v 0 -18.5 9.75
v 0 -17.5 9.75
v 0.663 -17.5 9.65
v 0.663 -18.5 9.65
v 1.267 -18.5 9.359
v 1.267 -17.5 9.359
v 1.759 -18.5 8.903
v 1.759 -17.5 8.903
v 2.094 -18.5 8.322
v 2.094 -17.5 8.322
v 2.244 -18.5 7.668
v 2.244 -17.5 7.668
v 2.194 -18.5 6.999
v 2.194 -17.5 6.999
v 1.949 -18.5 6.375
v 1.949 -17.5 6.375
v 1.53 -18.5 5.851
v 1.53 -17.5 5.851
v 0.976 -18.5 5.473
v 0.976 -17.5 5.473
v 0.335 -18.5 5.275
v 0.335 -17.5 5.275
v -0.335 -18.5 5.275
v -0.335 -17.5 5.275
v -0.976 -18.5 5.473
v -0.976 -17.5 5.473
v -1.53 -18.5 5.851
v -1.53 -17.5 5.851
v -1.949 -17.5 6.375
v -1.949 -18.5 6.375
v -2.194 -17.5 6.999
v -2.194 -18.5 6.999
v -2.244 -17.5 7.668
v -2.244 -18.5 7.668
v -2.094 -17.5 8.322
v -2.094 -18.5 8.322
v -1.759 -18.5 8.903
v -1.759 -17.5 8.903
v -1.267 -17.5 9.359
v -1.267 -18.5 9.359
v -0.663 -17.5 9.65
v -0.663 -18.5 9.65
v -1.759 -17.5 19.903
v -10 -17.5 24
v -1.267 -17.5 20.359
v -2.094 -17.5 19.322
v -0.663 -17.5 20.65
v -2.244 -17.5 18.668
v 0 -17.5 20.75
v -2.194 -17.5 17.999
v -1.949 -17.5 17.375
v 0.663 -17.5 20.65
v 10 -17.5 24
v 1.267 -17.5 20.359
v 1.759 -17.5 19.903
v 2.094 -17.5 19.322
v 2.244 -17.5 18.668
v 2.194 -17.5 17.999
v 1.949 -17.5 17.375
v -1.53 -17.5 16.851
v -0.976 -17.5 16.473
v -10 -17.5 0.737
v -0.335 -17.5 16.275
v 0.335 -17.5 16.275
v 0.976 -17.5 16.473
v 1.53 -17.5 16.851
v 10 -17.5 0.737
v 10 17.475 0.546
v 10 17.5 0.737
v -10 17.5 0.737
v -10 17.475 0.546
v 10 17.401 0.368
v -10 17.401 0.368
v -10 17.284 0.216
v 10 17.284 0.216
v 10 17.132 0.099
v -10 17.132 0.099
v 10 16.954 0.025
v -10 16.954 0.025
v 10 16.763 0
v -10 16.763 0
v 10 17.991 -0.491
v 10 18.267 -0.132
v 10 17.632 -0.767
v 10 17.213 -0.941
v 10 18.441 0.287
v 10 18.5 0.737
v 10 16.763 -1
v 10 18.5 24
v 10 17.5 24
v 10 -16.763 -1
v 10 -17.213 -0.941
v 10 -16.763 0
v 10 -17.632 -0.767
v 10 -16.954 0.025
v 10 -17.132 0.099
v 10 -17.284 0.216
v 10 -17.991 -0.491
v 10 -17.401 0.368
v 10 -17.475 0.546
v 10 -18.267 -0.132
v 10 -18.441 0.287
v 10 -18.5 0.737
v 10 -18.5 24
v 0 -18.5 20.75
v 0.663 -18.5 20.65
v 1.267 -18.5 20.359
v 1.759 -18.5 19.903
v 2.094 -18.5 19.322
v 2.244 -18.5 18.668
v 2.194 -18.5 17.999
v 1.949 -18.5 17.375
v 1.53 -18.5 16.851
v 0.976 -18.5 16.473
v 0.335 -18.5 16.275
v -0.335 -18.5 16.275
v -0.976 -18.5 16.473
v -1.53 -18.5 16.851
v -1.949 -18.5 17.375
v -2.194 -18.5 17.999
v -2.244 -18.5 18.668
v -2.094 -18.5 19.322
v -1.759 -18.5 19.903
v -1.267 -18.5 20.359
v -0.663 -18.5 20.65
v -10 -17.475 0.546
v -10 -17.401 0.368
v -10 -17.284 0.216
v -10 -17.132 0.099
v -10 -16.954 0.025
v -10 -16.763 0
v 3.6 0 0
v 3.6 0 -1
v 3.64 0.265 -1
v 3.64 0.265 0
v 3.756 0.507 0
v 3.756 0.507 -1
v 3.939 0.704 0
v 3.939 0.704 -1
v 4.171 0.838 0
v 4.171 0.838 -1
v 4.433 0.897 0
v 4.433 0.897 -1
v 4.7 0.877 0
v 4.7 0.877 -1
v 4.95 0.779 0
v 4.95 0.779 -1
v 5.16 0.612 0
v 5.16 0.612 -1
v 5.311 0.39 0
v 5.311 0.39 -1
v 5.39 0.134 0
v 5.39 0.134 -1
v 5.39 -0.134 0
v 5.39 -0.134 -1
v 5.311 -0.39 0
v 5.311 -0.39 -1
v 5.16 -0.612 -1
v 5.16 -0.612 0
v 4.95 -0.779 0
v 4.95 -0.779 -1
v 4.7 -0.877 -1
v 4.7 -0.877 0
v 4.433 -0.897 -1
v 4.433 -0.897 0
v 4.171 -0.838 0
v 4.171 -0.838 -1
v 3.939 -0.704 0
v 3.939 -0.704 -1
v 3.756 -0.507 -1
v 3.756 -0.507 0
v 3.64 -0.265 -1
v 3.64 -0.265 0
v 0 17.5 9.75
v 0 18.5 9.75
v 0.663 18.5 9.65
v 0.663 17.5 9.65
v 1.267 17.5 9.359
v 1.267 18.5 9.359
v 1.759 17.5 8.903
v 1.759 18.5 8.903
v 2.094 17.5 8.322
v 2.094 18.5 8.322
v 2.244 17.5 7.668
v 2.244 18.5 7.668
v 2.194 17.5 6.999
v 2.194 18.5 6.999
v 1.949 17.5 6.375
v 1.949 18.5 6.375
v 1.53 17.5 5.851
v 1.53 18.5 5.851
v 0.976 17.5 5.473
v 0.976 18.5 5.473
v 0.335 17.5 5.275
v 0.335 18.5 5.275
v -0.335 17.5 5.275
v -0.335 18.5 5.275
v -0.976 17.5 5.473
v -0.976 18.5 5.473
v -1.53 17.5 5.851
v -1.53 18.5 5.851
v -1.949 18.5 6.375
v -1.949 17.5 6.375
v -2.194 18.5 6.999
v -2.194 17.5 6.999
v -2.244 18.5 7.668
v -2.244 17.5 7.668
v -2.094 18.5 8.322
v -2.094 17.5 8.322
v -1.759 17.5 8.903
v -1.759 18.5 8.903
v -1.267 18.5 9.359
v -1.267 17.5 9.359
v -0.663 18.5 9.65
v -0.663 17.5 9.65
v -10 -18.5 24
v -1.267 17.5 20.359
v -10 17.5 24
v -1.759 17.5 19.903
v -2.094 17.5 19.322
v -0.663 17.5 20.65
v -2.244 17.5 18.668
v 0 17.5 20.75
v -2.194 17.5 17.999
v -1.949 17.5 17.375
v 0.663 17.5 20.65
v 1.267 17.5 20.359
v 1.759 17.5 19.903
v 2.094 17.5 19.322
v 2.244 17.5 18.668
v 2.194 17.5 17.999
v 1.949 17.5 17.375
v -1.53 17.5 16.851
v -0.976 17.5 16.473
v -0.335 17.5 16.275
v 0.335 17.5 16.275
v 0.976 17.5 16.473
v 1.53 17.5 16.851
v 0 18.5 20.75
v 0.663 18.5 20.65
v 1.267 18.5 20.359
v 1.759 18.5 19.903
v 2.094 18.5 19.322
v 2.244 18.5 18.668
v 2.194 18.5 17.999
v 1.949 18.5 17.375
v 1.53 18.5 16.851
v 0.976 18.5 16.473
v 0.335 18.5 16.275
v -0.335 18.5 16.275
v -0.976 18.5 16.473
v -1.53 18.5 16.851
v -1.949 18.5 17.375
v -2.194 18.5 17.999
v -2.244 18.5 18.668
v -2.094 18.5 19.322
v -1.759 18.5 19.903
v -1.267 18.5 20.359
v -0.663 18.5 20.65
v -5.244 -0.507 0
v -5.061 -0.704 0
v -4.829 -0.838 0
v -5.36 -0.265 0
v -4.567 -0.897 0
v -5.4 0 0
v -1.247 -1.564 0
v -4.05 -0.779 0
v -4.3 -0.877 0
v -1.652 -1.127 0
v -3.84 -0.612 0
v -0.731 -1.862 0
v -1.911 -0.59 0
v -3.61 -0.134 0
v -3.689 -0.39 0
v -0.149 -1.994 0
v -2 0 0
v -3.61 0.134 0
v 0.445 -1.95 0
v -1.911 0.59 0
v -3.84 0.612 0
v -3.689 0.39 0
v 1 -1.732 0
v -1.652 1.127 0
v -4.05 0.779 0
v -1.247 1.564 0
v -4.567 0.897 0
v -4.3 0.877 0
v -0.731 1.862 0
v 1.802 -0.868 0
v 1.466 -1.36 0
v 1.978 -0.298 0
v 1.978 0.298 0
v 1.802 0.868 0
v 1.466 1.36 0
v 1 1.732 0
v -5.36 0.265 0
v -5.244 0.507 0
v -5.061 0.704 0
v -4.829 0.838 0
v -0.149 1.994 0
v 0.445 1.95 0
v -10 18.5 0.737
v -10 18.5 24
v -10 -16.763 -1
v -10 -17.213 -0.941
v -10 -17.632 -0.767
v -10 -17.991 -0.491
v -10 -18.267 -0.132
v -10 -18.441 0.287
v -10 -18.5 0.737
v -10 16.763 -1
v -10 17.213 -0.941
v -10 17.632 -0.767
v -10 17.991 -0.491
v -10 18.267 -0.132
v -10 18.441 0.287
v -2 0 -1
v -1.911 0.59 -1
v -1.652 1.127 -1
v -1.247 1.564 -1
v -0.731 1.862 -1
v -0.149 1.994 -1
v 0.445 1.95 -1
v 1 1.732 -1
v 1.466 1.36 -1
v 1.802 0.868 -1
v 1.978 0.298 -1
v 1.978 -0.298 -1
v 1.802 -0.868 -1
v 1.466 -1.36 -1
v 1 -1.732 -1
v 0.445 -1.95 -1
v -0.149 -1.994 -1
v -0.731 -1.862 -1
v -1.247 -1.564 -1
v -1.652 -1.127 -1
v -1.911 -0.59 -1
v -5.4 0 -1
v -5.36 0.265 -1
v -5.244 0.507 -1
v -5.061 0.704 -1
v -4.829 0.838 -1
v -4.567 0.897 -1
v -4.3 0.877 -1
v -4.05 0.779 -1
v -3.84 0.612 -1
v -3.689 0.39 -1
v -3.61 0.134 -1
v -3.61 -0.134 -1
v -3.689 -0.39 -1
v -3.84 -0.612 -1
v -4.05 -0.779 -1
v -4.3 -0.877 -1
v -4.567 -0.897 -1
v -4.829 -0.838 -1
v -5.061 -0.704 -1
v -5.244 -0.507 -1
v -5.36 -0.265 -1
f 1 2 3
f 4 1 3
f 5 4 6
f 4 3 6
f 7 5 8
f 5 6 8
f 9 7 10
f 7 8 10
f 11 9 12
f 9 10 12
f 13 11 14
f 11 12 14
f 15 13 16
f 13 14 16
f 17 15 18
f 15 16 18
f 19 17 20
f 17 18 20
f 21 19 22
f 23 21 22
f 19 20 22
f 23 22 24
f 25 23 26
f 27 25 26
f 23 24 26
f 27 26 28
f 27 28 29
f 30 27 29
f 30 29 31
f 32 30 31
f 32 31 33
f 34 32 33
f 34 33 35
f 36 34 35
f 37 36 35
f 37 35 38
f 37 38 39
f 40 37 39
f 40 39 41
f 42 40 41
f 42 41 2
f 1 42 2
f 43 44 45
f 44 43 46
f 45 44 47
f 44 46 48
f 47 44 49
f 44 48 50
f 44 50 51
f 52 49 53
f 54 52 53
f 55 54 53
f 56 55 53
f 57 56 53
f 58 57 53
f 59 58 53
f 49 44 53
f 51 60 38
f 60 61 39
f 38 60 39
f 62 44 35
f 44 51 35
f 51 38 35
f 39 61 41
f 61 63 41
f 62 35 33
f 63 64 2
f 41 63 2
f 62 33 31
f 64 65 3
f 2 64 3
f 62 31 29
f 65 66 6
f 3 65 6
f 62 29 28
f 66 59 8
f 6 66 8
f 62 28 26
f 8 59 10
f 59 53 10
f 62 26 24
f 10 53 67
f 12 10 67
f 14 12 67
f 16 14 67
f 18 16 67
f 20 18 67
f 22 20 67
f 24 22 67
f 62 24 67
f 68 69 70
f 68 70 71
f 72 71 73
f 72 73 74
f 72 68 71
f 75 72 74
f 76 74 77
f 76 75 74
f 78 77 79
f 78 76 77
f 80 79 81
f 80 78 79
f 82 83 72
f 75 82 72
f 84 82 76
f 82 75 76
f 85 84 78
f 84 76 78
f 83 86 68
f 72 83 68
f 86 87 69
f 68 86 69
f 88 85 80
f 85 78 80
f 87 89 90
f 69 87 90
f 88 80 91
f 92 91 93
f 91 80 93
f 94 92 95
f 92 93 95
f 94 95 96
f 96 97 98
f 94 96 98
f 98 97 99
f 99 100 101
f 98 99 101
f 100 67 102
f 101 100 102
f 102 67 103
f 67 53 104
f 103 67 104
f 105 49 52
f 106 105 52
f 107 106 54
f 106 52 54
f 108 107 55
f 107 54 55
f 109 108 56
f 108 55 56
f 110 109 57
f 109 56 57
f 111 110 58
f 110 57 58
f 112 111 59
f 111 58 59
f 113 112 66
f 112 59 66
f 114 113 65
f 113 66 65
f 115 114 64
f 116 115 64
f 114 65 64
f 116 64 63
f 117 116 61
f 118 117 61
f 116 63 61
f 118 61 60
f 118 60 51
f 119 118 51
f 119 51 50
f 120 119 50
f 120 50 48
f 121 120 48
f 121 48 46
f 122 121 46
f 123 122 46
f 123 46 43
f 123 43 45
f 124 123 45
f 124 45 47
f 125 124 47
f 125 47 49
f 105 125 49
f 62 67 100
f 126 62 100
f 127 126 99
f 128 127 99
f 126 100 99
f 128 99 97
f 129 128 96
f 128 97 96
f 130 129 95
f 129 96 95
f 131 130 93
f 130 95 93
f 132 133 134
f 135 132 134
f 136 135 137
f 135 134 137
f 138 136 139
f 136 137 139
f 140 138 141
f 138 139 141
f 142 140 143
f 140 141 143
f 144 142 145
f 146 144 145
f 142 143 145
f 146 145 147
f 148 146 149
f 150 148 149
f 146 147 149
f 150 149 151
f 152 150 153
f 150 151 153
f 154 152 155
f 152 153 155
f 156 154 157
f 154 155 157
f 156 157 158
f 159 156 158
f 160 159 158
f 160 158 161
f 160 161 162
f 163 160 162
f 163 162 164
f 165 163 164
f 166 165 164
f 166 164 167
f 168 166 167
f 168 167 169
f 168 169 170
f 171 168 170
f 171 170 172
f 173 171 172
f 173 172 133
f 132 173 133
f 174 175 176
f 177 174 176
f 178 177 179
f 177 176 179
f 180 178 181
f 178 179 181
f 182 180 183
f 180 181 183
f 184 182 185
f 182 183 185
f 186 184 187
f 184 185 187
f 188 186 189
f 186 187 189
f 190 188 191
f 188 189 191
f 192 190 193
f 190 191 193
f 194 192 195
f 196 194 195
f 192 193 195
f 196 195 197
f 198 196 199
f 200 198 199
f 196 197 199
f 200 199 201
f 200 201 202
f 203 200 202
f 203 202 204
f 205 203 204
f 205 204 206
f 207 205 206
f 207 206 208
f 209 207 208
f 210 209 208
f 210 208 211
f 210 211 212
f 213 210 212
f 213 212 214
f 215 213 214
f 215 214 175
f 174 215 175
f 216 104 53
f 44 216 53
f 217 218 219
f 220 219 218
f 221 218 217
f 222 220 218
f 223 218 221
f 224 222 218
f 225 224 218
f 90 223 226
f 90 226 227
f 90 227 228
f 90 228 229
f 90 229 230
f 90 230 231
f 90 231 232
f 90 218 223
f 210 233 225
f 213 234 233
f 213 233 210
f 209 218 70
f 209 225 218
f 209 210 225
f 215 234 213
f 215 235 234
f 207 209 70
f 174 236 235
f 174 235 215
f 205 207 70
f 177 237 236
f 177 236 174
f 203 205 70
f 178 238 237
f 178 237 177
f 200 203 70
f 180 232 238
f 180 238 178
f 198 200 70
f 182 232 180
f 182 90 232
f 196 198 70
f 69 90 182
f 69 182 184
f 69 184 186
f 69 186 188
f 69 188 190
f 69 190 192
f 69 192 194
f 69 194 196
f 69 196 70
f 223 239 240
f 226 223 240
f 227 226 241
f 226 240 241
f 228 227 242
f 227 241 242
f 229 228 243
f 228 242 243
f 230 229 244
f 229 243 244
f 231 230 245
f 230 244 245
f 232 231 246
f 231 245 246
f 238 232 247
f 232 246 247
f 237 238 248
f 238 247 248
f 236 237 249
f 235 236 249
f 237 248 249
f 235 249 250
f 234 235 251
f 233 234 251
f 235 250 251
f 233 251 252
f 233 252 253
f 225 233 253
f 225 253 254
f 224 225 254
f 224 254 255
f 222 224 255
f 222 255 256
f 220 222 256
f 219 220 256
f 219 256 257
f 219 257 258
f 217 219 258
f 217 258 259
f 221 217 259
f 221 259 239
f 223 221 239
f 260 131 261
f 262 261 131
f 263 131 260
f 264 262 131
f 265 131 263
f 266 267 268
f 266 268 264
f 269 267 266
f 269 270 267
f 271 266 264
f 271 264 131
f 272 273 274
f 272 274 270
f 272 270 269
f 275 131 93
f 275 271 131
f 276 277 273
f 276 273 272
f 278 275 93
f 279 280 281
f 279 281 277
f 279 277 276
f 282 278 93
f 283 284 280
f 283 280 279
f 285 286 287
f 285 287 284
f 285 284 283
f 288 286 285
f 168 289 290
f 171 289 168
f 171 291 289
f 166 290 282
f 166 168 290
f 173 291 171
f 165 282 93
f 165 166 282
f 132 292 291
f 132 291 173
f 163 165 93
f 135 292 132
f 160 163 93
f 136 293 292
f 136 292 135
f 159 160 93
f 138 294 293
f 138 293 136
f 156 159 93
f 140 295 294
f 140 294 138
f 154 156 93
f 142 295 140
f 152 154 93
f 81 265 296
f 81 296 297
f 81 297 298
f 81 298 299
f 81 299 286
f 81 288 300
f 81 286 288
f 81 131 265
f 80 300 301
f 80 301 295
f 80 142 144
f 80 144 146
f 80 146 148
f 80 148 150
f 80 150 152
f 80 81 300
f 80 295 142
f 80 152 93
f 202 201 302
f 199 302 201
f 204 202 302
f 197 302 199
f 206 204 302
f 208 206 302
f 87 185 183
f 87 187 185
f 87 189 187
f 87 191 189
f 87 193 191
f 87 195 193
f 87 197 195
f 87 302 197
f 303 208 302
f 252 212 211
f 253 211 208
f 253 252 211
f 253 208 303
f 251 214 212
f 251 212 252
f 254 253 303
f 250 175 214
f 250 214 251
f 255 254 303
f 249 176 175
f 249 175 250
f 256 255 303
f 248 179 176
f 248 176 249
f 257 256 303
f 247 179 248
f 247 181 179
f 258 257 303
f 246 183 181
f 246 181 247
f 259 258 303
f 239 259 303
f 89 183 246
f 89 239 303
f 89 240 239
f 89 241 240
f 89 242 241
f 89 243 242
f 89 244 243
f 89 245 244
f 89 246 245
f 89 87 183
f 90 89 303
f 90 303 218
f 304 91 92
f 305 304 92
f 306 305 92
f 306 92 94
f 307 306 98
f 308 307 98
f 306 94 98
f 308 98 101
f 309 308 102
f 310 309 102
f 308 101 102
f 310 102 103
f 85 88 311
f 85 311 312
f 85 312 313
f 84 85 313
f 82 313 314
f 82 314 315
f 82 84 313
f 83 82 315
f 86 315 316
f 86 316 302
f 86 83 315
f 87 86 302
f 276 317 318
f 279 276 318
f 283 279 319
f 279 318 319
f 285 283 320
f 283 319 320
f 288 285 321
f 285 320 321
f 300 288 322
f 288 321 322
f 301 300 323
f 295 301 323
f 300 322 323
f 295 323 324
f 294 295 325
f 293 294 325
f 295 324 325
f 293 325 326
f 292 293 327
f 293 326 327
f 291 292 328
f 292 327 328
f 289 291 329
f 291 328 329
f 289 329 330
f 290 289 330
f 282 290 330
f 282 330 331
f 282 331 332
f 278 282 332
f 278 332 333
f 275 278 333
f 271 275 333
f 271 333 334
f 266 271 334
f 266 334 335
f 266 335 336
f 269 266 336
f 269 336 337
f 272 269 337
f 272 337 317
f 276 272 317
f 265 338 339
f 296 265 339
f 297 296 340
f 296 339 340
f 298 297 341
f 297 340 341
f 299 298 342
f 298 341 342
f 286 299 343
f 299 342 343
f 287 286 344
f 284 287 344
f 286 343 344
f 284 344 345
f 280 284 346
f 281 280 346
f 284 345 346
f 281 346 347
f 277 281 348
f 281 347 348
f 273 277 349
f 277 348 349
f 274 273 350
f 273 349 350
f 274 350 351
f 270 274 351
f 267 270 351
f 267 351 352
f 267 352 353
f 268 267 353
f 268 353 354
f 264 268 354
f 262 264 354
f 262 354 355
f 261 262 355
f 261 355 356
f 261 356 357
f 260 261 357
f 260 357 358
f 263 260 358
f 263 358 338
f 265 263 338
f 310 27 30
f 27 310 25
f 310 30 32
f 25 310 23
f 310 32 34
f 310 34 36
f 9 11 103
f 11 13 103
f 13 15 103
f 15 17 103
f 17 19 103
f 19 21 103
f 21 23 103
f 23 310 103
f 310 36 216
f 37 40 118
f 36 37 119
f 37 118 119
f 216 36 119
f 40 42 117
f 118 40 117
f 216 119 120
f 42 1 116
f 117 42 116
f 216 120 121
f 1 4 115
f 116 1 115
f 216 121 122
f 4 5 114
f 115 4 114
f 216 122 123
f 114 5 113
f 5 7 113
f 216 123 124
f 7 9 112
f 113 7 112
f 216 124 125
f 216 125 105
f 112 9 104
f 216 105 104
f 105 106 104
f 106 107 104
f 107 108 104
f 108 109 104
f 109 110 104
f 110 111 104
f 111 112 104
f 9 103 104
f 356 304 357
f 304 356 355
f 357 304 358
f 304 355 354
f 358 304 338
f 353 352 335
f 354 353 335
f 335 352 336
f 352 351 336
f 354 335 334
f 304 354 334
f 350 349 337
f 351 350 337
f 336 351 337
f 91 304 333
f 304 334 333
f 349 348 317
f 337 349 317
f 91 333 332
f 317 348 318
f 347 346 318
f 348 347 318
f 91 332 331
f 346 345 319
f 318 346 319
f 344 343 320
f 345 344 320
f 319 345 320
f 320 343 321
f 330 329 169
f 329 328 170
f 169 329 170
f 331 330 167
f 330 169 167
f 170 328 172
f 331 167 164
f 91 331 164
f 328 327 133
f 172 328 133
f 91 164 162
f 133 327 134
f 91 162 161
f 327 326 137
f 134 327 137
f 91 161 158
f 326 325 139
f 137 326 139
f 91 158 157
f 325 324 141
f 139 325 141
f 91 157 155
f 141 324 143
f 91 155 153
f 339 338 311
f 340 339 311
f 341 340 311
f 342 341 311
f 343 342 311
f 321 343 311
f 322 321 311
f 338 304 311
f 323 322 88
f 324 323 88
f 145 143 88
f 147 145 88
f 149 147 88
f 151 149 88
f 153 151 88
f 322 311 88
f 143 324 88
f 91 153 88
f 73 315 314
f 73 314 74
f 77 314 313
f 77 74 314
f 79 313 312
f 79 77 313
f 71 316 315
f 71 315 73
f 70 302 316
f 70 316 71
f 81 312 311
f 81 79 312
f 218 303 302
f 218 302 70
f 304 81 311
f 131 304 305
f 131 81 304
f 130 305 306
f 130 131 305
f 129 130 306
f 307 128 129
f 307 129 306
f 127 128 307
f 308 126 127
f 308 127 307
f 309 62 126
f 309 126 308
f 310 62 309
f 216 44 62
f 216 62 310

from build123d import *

# Parameters (mm, degrees)
SKETCH1_W                    = 20
SKETCH1_H                    = 37
BASE_FLANGE1_DEPTH           = 1
EDGE_FLANGE1_STRIP_W         = 5.4732
EDGE_FLANGE1_STRIP_H         = 1
EDGE_FLANGE1_STRIP_CUT_DEPTH = 20
EDGE_FLANGE1_DEPTH           = 20
SKETCH9_R                    = 2
SKETCH9_R_2                  = 0.9
CUT_EXTRUDE1_DEPTH           = 10
SKETCH10_R                   = 2.25
CUT_EXTRUDE2_DEPTH           = 46.221676218


# Sheet-metal steps are written as plain solids
with BuildPart() as part:
    # Sketch1 → Base-Flange1 (new body)
    with BuildSketch(Plane.XY):
        Rectangle(SKETCH1_W, SKETCH1_H)
    extrude(amount=-BASE_FLANGE1_DEPTH)

    # Edge-Flange1 strip (across the edge) → Edge-Flange1 strip cut (cut)
    with BuildSketch(Plane(origin=(10, 18.5, 0), x_dir=(0, -1, 0), z_dir=(-1, 0, 0))):
        with Locations((-1, -0.5)):
            Rectangle(EDGE_FLANGE1_STRIP_W, EDGE_FLANGE1_STRIP_H)
    edge_flange1_strip_cut = extrude(amount=EDGE_FLANGE1_STRIP_CUT_DEPTH, mode=Mode.SUBTRACT)

    # Edge-Flange1 section (across the edge) → Edge-Flange1 (add)
    with BuildSketch(Plane(origin=(10, 18.5, 0), x_dir=(0, -1, 0), z_dir=(-1, 0, 0))):
        with BuildLine():
            Line((0, 0.7366), (0, 24))
            Line((0, 24), (1, 24))
            Line((1, 24), (1, 0.7366))
            ThreePointArc((1, 0.7366), (1.215745145, 0.215745145), (1.7366, 0))
            Line((1.7366, 0), (1.7366, -1))
            ThreePointArc((1.7366, -1), (0.508638364, -0.491361636), (0, 0.7366))
        make_face()
    edge_flange1 = extrude(amount=EDGE_FLANGE1_DEPTH)

    # Mirror1: Edge-Flange1 strip cut, Edge-Flange1 across plane
    add(edge_flange1_strip_cut.mirror(Plane.ZX), mode=Mode.SUBTRACT)
    add(edge_flange1.mirror(Plane.ZX))

    # Sketch9 → Cut-Extrude1 (cut)
    with BuildSketch(Plane(origin=(0, 0, -1), x_dir=(-1, 0, 0), z_dir=(0, 0, -1))):
        Circle(SKETCH9_R)
        with Locations((-4.5, 0)):
            Circle(SKETCH9_R_2)
        with Locations((4.5, 0)):
            Circle(SKETCH9_R_2)
    extrude(amount=-CUT_EXTRUDE1_DEPTH, mode=Mode.SUBTRACT)

    # Sketch10 → Cut-Extrude2 (cut, through all)
    with BuildSketch(Plane(origin=(0, 18.5, 0), x_dir=(1, 0, 0), z_dir=(0, 1, 0))):
        with Locations(Location((0, -7.5, 0), (0, 0, 270))):
            Circle(SKETCH10_R)
        with Locations(Location((0, -18.5, 0), (0, 0, 270))):
            Circle(SKETCH10_R)
    extrude(amount=-CUT_EXTRUDE2_DEPTH, mode=Mode.SUBTRACT)


solid = part.part
